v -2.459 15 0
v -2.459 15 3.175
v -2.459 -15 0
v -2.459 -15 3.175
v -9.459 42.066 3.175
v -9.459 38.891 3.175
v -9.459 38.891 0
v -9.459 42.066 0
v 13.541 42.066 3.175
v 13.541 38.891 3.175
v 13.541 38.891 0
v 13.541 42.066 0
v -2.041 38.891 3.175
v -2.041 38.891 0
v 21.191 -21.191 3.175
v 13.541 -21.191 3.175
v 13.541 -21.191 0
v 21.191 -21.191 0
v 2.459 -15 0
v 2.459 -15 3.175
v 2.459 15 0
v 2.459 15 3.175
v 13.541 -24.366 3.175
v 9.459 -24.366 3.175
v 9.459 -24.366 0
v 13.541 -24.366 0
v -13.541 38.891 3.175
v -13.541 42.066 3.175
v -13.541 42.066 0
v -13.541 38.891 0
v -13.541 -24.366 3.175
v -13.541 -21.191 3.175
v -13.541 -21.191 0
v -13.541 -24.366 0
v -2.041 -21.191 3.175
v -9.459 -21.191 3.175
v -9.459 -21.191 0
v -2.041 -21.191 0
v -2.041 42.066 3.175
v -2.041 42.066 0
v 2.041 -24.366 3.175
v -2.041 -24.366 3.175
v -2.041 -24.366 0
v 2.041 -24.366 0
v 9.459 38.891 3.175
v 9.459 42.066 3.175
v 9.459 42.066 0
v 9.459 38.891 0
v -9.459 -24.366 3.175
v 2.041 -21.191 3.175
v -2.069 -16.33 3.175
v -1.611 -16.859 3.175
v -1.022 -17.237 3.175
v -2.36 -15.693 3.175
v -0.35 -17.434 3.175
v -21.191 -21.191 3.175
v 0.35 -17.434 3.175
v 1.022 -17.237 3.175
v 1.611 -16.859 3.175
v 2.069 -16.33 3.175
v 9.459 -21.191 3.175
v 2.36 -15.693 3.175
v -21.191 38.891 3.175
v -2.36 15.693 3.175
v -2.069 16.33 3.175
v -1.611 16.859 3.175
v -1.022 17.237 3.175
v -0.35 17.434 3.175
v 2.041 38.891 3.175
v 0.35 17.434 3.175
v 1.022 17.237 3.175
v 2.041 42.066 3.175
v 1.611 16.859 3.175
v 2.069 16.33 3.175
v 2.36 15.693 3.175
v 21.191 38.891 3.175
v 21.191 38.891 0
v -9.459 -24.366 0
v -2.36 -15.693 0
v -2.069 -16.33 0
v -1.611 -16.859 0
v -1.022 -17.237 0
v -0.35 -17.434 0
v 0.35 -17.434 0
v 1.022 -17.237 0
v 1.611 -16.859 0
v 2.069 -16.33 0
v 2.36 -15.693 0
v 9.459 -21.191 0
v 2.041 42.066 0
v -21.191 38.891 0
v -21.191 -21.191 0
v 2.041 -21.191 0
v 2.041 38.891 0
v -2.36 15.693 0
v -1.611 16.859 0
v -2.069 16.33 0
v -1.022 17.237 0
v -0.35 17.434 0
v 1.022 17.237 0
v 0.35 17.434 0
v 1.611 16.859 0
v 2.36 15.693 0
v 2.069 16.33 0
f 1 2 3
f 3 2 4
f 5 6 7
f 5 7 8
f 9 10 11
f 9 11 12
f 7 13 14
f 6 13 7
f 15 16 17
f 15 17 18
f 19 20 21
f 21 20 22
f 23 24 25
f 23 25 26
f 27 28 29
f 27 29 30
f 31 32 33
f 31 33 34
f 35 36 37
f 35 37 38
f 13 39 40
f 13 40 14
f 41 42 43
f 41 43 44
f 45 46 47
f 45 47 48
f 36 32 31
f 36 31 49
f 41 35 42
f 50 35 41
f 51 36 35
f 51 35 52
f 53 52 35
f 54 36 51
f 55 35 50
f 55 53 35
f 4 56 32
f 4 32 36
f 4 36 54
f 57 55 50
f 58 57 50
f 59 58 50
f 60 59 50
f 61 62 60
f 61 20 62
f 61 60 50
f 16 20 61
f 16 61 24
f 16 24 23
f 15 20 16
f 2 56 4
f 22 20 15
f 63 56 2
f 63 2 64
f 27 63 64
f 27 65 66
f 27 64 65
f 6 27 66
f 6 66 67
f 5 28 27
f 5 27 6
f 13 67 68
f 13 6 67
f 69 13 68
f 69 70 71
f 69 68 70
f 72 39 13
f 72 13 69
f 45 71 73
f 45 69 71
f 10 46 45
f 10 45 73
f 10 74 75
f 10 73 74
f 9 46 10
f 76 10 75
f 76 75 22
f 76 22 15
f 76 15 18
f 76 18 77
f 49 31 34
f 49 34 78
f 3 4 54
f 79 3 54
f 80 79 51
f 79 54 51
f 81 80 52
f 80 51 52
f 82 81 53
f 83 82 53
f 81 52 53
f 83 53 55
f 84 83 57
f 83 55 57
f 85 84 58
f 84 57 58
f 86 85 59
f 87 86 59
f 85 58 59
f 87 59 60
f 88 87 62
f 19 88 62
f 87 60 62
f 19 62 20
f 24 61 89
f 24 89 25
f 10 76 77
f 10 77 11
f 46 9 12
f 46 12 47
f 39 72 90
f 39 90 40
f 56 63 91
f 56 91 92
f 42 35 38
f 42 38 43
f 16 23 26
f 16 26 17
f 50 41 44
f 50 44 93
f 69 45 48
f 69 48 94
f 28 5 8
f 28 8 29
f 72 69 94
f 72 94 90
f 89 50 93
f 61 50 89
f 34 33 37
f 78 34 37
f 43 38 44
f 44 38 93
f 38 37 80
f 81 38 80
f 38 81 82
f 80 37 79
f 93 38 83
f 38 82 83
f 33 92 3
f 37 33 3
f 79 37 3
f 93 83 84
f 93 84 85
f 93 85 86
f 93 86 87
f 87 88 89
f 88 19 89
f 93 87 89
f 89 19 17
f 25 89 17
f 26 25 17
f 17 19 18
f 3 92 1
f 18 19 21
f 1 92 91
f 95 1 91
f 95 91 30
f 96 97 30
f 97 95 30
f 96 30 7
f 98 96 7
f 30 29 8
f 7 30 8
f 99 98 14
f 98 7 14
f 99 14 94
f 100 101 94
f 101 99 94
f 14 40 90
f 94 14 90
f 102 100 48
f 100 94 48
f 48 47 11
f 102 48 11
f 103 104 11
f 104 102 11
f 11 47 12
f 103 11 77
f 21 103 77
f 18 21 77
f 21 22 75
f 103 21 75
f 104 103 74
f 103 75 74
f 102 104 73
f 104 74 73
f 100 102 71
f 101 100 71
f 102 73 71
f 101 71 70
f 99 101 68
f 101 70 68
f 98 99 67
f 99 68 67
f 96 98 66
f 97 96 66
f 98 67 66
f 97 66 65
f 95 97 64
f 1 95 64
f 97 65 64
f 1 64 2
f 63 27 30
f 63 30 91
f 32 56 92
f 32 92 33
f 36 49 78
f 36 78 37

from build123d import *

# Parameters (mm, degrees)
BOSS_EXTRUDE1_DEPTH = 3.175
BOSS_EXTRUDE2_DEPTH = 3.175


with BuildPart() as part:
    # Sketch1 → Boss-Extrude1 (new body)
    with BuildSketch(Plane.XY):
        Polygon((-13.5, 38.85), (-21.15, 38.85), (-21.15, -21.15), (-13.5, -21.15), (-13.5, -24.325), (-9.5, -24.325), (-9.5, -21.15), (-2, -21.15), (-2, -24.325), (2, -24.325), (2, -21.15), (9.5, -21.15), (9.5, -24.325), (13.5, -24.325), (13.5, -21.15), (21.15, -21.15), (21.15, 38.85), (13.5, 38.85), (13.5, 42.025), (9.5, 42.025), (9.5, 38.85), (2, 38.85), (2, 42.025), (-2, 42.025), (-2, 38.85), (-9.5, 38.85), (-9.5, 42.025), (-13.5, 42.025), align=None)
        with BuildLine():
            Line((-2.5, -15), (-2.5, 15))
            ThreePointArc((-2.5, 15), (0, 17.5), (2.5, 15))
            Line((2.5, 15), (2.5, -15))
            ThreePointArc((2.5, -15), (0, -17.5), (-2.5, -15))
        make_face(mode=Mode.SUBTRACT)
    extrude(amount=BOSS_EXTRUDE1_DEPTH)

    # Sketch2 → Boss-Extrude2 (add)
    with BuildSketch(Plane.XY.offset(3.175)):
        Polygon((21.19064, -21.19064), (21.19064, 38.89064), (13.54064, 38.89064), (13.54064, 42.06564), (9.45936, 42.06564), (9.45936, 38.89064), (2.04064, 38.89064), (2.04064, 42.06564), (-2.04064, 42.06564), (-2.04064, 38.89064), (-9.45936, 38.89064), (-9.45936, 42.06564), (-13.54064, 42.06564), (-13.54064, 38.89064), (-21.19064, 38.89064), (-21.19064, -21.19064), (-13.54064, -21.19064), (-13.54064, -24.36564), (-9.45936, -24.36564), (-9.45936, -21.19064), (-2.04064, -21.19064), (-2.04064, -24.36564), (2.04064, -24.36564), (2.04064, -21.19064), (9.45936, -21.19064), (9.45936, -24.36564), (13.54064, -24.36564), (13.54064, -21.19064), align=None)
        with BuildLine():
            Line((-2.45936, 15), (-2.45936, -15))
            ThreePointArc((-2.45936, -15), (0, -17.45936), (2.45936, -15))
            Line((2.45936, -15), (2.45936, 15))
            ThreePointArc((2.45936, 15), (0, 17.45936), (-2.45936, 15))
        make_face(mode=Mode.SUBTRACT)
    extrude(amount=-BOSS_EXTRUDE2_DEPTH)


solid = part.part
